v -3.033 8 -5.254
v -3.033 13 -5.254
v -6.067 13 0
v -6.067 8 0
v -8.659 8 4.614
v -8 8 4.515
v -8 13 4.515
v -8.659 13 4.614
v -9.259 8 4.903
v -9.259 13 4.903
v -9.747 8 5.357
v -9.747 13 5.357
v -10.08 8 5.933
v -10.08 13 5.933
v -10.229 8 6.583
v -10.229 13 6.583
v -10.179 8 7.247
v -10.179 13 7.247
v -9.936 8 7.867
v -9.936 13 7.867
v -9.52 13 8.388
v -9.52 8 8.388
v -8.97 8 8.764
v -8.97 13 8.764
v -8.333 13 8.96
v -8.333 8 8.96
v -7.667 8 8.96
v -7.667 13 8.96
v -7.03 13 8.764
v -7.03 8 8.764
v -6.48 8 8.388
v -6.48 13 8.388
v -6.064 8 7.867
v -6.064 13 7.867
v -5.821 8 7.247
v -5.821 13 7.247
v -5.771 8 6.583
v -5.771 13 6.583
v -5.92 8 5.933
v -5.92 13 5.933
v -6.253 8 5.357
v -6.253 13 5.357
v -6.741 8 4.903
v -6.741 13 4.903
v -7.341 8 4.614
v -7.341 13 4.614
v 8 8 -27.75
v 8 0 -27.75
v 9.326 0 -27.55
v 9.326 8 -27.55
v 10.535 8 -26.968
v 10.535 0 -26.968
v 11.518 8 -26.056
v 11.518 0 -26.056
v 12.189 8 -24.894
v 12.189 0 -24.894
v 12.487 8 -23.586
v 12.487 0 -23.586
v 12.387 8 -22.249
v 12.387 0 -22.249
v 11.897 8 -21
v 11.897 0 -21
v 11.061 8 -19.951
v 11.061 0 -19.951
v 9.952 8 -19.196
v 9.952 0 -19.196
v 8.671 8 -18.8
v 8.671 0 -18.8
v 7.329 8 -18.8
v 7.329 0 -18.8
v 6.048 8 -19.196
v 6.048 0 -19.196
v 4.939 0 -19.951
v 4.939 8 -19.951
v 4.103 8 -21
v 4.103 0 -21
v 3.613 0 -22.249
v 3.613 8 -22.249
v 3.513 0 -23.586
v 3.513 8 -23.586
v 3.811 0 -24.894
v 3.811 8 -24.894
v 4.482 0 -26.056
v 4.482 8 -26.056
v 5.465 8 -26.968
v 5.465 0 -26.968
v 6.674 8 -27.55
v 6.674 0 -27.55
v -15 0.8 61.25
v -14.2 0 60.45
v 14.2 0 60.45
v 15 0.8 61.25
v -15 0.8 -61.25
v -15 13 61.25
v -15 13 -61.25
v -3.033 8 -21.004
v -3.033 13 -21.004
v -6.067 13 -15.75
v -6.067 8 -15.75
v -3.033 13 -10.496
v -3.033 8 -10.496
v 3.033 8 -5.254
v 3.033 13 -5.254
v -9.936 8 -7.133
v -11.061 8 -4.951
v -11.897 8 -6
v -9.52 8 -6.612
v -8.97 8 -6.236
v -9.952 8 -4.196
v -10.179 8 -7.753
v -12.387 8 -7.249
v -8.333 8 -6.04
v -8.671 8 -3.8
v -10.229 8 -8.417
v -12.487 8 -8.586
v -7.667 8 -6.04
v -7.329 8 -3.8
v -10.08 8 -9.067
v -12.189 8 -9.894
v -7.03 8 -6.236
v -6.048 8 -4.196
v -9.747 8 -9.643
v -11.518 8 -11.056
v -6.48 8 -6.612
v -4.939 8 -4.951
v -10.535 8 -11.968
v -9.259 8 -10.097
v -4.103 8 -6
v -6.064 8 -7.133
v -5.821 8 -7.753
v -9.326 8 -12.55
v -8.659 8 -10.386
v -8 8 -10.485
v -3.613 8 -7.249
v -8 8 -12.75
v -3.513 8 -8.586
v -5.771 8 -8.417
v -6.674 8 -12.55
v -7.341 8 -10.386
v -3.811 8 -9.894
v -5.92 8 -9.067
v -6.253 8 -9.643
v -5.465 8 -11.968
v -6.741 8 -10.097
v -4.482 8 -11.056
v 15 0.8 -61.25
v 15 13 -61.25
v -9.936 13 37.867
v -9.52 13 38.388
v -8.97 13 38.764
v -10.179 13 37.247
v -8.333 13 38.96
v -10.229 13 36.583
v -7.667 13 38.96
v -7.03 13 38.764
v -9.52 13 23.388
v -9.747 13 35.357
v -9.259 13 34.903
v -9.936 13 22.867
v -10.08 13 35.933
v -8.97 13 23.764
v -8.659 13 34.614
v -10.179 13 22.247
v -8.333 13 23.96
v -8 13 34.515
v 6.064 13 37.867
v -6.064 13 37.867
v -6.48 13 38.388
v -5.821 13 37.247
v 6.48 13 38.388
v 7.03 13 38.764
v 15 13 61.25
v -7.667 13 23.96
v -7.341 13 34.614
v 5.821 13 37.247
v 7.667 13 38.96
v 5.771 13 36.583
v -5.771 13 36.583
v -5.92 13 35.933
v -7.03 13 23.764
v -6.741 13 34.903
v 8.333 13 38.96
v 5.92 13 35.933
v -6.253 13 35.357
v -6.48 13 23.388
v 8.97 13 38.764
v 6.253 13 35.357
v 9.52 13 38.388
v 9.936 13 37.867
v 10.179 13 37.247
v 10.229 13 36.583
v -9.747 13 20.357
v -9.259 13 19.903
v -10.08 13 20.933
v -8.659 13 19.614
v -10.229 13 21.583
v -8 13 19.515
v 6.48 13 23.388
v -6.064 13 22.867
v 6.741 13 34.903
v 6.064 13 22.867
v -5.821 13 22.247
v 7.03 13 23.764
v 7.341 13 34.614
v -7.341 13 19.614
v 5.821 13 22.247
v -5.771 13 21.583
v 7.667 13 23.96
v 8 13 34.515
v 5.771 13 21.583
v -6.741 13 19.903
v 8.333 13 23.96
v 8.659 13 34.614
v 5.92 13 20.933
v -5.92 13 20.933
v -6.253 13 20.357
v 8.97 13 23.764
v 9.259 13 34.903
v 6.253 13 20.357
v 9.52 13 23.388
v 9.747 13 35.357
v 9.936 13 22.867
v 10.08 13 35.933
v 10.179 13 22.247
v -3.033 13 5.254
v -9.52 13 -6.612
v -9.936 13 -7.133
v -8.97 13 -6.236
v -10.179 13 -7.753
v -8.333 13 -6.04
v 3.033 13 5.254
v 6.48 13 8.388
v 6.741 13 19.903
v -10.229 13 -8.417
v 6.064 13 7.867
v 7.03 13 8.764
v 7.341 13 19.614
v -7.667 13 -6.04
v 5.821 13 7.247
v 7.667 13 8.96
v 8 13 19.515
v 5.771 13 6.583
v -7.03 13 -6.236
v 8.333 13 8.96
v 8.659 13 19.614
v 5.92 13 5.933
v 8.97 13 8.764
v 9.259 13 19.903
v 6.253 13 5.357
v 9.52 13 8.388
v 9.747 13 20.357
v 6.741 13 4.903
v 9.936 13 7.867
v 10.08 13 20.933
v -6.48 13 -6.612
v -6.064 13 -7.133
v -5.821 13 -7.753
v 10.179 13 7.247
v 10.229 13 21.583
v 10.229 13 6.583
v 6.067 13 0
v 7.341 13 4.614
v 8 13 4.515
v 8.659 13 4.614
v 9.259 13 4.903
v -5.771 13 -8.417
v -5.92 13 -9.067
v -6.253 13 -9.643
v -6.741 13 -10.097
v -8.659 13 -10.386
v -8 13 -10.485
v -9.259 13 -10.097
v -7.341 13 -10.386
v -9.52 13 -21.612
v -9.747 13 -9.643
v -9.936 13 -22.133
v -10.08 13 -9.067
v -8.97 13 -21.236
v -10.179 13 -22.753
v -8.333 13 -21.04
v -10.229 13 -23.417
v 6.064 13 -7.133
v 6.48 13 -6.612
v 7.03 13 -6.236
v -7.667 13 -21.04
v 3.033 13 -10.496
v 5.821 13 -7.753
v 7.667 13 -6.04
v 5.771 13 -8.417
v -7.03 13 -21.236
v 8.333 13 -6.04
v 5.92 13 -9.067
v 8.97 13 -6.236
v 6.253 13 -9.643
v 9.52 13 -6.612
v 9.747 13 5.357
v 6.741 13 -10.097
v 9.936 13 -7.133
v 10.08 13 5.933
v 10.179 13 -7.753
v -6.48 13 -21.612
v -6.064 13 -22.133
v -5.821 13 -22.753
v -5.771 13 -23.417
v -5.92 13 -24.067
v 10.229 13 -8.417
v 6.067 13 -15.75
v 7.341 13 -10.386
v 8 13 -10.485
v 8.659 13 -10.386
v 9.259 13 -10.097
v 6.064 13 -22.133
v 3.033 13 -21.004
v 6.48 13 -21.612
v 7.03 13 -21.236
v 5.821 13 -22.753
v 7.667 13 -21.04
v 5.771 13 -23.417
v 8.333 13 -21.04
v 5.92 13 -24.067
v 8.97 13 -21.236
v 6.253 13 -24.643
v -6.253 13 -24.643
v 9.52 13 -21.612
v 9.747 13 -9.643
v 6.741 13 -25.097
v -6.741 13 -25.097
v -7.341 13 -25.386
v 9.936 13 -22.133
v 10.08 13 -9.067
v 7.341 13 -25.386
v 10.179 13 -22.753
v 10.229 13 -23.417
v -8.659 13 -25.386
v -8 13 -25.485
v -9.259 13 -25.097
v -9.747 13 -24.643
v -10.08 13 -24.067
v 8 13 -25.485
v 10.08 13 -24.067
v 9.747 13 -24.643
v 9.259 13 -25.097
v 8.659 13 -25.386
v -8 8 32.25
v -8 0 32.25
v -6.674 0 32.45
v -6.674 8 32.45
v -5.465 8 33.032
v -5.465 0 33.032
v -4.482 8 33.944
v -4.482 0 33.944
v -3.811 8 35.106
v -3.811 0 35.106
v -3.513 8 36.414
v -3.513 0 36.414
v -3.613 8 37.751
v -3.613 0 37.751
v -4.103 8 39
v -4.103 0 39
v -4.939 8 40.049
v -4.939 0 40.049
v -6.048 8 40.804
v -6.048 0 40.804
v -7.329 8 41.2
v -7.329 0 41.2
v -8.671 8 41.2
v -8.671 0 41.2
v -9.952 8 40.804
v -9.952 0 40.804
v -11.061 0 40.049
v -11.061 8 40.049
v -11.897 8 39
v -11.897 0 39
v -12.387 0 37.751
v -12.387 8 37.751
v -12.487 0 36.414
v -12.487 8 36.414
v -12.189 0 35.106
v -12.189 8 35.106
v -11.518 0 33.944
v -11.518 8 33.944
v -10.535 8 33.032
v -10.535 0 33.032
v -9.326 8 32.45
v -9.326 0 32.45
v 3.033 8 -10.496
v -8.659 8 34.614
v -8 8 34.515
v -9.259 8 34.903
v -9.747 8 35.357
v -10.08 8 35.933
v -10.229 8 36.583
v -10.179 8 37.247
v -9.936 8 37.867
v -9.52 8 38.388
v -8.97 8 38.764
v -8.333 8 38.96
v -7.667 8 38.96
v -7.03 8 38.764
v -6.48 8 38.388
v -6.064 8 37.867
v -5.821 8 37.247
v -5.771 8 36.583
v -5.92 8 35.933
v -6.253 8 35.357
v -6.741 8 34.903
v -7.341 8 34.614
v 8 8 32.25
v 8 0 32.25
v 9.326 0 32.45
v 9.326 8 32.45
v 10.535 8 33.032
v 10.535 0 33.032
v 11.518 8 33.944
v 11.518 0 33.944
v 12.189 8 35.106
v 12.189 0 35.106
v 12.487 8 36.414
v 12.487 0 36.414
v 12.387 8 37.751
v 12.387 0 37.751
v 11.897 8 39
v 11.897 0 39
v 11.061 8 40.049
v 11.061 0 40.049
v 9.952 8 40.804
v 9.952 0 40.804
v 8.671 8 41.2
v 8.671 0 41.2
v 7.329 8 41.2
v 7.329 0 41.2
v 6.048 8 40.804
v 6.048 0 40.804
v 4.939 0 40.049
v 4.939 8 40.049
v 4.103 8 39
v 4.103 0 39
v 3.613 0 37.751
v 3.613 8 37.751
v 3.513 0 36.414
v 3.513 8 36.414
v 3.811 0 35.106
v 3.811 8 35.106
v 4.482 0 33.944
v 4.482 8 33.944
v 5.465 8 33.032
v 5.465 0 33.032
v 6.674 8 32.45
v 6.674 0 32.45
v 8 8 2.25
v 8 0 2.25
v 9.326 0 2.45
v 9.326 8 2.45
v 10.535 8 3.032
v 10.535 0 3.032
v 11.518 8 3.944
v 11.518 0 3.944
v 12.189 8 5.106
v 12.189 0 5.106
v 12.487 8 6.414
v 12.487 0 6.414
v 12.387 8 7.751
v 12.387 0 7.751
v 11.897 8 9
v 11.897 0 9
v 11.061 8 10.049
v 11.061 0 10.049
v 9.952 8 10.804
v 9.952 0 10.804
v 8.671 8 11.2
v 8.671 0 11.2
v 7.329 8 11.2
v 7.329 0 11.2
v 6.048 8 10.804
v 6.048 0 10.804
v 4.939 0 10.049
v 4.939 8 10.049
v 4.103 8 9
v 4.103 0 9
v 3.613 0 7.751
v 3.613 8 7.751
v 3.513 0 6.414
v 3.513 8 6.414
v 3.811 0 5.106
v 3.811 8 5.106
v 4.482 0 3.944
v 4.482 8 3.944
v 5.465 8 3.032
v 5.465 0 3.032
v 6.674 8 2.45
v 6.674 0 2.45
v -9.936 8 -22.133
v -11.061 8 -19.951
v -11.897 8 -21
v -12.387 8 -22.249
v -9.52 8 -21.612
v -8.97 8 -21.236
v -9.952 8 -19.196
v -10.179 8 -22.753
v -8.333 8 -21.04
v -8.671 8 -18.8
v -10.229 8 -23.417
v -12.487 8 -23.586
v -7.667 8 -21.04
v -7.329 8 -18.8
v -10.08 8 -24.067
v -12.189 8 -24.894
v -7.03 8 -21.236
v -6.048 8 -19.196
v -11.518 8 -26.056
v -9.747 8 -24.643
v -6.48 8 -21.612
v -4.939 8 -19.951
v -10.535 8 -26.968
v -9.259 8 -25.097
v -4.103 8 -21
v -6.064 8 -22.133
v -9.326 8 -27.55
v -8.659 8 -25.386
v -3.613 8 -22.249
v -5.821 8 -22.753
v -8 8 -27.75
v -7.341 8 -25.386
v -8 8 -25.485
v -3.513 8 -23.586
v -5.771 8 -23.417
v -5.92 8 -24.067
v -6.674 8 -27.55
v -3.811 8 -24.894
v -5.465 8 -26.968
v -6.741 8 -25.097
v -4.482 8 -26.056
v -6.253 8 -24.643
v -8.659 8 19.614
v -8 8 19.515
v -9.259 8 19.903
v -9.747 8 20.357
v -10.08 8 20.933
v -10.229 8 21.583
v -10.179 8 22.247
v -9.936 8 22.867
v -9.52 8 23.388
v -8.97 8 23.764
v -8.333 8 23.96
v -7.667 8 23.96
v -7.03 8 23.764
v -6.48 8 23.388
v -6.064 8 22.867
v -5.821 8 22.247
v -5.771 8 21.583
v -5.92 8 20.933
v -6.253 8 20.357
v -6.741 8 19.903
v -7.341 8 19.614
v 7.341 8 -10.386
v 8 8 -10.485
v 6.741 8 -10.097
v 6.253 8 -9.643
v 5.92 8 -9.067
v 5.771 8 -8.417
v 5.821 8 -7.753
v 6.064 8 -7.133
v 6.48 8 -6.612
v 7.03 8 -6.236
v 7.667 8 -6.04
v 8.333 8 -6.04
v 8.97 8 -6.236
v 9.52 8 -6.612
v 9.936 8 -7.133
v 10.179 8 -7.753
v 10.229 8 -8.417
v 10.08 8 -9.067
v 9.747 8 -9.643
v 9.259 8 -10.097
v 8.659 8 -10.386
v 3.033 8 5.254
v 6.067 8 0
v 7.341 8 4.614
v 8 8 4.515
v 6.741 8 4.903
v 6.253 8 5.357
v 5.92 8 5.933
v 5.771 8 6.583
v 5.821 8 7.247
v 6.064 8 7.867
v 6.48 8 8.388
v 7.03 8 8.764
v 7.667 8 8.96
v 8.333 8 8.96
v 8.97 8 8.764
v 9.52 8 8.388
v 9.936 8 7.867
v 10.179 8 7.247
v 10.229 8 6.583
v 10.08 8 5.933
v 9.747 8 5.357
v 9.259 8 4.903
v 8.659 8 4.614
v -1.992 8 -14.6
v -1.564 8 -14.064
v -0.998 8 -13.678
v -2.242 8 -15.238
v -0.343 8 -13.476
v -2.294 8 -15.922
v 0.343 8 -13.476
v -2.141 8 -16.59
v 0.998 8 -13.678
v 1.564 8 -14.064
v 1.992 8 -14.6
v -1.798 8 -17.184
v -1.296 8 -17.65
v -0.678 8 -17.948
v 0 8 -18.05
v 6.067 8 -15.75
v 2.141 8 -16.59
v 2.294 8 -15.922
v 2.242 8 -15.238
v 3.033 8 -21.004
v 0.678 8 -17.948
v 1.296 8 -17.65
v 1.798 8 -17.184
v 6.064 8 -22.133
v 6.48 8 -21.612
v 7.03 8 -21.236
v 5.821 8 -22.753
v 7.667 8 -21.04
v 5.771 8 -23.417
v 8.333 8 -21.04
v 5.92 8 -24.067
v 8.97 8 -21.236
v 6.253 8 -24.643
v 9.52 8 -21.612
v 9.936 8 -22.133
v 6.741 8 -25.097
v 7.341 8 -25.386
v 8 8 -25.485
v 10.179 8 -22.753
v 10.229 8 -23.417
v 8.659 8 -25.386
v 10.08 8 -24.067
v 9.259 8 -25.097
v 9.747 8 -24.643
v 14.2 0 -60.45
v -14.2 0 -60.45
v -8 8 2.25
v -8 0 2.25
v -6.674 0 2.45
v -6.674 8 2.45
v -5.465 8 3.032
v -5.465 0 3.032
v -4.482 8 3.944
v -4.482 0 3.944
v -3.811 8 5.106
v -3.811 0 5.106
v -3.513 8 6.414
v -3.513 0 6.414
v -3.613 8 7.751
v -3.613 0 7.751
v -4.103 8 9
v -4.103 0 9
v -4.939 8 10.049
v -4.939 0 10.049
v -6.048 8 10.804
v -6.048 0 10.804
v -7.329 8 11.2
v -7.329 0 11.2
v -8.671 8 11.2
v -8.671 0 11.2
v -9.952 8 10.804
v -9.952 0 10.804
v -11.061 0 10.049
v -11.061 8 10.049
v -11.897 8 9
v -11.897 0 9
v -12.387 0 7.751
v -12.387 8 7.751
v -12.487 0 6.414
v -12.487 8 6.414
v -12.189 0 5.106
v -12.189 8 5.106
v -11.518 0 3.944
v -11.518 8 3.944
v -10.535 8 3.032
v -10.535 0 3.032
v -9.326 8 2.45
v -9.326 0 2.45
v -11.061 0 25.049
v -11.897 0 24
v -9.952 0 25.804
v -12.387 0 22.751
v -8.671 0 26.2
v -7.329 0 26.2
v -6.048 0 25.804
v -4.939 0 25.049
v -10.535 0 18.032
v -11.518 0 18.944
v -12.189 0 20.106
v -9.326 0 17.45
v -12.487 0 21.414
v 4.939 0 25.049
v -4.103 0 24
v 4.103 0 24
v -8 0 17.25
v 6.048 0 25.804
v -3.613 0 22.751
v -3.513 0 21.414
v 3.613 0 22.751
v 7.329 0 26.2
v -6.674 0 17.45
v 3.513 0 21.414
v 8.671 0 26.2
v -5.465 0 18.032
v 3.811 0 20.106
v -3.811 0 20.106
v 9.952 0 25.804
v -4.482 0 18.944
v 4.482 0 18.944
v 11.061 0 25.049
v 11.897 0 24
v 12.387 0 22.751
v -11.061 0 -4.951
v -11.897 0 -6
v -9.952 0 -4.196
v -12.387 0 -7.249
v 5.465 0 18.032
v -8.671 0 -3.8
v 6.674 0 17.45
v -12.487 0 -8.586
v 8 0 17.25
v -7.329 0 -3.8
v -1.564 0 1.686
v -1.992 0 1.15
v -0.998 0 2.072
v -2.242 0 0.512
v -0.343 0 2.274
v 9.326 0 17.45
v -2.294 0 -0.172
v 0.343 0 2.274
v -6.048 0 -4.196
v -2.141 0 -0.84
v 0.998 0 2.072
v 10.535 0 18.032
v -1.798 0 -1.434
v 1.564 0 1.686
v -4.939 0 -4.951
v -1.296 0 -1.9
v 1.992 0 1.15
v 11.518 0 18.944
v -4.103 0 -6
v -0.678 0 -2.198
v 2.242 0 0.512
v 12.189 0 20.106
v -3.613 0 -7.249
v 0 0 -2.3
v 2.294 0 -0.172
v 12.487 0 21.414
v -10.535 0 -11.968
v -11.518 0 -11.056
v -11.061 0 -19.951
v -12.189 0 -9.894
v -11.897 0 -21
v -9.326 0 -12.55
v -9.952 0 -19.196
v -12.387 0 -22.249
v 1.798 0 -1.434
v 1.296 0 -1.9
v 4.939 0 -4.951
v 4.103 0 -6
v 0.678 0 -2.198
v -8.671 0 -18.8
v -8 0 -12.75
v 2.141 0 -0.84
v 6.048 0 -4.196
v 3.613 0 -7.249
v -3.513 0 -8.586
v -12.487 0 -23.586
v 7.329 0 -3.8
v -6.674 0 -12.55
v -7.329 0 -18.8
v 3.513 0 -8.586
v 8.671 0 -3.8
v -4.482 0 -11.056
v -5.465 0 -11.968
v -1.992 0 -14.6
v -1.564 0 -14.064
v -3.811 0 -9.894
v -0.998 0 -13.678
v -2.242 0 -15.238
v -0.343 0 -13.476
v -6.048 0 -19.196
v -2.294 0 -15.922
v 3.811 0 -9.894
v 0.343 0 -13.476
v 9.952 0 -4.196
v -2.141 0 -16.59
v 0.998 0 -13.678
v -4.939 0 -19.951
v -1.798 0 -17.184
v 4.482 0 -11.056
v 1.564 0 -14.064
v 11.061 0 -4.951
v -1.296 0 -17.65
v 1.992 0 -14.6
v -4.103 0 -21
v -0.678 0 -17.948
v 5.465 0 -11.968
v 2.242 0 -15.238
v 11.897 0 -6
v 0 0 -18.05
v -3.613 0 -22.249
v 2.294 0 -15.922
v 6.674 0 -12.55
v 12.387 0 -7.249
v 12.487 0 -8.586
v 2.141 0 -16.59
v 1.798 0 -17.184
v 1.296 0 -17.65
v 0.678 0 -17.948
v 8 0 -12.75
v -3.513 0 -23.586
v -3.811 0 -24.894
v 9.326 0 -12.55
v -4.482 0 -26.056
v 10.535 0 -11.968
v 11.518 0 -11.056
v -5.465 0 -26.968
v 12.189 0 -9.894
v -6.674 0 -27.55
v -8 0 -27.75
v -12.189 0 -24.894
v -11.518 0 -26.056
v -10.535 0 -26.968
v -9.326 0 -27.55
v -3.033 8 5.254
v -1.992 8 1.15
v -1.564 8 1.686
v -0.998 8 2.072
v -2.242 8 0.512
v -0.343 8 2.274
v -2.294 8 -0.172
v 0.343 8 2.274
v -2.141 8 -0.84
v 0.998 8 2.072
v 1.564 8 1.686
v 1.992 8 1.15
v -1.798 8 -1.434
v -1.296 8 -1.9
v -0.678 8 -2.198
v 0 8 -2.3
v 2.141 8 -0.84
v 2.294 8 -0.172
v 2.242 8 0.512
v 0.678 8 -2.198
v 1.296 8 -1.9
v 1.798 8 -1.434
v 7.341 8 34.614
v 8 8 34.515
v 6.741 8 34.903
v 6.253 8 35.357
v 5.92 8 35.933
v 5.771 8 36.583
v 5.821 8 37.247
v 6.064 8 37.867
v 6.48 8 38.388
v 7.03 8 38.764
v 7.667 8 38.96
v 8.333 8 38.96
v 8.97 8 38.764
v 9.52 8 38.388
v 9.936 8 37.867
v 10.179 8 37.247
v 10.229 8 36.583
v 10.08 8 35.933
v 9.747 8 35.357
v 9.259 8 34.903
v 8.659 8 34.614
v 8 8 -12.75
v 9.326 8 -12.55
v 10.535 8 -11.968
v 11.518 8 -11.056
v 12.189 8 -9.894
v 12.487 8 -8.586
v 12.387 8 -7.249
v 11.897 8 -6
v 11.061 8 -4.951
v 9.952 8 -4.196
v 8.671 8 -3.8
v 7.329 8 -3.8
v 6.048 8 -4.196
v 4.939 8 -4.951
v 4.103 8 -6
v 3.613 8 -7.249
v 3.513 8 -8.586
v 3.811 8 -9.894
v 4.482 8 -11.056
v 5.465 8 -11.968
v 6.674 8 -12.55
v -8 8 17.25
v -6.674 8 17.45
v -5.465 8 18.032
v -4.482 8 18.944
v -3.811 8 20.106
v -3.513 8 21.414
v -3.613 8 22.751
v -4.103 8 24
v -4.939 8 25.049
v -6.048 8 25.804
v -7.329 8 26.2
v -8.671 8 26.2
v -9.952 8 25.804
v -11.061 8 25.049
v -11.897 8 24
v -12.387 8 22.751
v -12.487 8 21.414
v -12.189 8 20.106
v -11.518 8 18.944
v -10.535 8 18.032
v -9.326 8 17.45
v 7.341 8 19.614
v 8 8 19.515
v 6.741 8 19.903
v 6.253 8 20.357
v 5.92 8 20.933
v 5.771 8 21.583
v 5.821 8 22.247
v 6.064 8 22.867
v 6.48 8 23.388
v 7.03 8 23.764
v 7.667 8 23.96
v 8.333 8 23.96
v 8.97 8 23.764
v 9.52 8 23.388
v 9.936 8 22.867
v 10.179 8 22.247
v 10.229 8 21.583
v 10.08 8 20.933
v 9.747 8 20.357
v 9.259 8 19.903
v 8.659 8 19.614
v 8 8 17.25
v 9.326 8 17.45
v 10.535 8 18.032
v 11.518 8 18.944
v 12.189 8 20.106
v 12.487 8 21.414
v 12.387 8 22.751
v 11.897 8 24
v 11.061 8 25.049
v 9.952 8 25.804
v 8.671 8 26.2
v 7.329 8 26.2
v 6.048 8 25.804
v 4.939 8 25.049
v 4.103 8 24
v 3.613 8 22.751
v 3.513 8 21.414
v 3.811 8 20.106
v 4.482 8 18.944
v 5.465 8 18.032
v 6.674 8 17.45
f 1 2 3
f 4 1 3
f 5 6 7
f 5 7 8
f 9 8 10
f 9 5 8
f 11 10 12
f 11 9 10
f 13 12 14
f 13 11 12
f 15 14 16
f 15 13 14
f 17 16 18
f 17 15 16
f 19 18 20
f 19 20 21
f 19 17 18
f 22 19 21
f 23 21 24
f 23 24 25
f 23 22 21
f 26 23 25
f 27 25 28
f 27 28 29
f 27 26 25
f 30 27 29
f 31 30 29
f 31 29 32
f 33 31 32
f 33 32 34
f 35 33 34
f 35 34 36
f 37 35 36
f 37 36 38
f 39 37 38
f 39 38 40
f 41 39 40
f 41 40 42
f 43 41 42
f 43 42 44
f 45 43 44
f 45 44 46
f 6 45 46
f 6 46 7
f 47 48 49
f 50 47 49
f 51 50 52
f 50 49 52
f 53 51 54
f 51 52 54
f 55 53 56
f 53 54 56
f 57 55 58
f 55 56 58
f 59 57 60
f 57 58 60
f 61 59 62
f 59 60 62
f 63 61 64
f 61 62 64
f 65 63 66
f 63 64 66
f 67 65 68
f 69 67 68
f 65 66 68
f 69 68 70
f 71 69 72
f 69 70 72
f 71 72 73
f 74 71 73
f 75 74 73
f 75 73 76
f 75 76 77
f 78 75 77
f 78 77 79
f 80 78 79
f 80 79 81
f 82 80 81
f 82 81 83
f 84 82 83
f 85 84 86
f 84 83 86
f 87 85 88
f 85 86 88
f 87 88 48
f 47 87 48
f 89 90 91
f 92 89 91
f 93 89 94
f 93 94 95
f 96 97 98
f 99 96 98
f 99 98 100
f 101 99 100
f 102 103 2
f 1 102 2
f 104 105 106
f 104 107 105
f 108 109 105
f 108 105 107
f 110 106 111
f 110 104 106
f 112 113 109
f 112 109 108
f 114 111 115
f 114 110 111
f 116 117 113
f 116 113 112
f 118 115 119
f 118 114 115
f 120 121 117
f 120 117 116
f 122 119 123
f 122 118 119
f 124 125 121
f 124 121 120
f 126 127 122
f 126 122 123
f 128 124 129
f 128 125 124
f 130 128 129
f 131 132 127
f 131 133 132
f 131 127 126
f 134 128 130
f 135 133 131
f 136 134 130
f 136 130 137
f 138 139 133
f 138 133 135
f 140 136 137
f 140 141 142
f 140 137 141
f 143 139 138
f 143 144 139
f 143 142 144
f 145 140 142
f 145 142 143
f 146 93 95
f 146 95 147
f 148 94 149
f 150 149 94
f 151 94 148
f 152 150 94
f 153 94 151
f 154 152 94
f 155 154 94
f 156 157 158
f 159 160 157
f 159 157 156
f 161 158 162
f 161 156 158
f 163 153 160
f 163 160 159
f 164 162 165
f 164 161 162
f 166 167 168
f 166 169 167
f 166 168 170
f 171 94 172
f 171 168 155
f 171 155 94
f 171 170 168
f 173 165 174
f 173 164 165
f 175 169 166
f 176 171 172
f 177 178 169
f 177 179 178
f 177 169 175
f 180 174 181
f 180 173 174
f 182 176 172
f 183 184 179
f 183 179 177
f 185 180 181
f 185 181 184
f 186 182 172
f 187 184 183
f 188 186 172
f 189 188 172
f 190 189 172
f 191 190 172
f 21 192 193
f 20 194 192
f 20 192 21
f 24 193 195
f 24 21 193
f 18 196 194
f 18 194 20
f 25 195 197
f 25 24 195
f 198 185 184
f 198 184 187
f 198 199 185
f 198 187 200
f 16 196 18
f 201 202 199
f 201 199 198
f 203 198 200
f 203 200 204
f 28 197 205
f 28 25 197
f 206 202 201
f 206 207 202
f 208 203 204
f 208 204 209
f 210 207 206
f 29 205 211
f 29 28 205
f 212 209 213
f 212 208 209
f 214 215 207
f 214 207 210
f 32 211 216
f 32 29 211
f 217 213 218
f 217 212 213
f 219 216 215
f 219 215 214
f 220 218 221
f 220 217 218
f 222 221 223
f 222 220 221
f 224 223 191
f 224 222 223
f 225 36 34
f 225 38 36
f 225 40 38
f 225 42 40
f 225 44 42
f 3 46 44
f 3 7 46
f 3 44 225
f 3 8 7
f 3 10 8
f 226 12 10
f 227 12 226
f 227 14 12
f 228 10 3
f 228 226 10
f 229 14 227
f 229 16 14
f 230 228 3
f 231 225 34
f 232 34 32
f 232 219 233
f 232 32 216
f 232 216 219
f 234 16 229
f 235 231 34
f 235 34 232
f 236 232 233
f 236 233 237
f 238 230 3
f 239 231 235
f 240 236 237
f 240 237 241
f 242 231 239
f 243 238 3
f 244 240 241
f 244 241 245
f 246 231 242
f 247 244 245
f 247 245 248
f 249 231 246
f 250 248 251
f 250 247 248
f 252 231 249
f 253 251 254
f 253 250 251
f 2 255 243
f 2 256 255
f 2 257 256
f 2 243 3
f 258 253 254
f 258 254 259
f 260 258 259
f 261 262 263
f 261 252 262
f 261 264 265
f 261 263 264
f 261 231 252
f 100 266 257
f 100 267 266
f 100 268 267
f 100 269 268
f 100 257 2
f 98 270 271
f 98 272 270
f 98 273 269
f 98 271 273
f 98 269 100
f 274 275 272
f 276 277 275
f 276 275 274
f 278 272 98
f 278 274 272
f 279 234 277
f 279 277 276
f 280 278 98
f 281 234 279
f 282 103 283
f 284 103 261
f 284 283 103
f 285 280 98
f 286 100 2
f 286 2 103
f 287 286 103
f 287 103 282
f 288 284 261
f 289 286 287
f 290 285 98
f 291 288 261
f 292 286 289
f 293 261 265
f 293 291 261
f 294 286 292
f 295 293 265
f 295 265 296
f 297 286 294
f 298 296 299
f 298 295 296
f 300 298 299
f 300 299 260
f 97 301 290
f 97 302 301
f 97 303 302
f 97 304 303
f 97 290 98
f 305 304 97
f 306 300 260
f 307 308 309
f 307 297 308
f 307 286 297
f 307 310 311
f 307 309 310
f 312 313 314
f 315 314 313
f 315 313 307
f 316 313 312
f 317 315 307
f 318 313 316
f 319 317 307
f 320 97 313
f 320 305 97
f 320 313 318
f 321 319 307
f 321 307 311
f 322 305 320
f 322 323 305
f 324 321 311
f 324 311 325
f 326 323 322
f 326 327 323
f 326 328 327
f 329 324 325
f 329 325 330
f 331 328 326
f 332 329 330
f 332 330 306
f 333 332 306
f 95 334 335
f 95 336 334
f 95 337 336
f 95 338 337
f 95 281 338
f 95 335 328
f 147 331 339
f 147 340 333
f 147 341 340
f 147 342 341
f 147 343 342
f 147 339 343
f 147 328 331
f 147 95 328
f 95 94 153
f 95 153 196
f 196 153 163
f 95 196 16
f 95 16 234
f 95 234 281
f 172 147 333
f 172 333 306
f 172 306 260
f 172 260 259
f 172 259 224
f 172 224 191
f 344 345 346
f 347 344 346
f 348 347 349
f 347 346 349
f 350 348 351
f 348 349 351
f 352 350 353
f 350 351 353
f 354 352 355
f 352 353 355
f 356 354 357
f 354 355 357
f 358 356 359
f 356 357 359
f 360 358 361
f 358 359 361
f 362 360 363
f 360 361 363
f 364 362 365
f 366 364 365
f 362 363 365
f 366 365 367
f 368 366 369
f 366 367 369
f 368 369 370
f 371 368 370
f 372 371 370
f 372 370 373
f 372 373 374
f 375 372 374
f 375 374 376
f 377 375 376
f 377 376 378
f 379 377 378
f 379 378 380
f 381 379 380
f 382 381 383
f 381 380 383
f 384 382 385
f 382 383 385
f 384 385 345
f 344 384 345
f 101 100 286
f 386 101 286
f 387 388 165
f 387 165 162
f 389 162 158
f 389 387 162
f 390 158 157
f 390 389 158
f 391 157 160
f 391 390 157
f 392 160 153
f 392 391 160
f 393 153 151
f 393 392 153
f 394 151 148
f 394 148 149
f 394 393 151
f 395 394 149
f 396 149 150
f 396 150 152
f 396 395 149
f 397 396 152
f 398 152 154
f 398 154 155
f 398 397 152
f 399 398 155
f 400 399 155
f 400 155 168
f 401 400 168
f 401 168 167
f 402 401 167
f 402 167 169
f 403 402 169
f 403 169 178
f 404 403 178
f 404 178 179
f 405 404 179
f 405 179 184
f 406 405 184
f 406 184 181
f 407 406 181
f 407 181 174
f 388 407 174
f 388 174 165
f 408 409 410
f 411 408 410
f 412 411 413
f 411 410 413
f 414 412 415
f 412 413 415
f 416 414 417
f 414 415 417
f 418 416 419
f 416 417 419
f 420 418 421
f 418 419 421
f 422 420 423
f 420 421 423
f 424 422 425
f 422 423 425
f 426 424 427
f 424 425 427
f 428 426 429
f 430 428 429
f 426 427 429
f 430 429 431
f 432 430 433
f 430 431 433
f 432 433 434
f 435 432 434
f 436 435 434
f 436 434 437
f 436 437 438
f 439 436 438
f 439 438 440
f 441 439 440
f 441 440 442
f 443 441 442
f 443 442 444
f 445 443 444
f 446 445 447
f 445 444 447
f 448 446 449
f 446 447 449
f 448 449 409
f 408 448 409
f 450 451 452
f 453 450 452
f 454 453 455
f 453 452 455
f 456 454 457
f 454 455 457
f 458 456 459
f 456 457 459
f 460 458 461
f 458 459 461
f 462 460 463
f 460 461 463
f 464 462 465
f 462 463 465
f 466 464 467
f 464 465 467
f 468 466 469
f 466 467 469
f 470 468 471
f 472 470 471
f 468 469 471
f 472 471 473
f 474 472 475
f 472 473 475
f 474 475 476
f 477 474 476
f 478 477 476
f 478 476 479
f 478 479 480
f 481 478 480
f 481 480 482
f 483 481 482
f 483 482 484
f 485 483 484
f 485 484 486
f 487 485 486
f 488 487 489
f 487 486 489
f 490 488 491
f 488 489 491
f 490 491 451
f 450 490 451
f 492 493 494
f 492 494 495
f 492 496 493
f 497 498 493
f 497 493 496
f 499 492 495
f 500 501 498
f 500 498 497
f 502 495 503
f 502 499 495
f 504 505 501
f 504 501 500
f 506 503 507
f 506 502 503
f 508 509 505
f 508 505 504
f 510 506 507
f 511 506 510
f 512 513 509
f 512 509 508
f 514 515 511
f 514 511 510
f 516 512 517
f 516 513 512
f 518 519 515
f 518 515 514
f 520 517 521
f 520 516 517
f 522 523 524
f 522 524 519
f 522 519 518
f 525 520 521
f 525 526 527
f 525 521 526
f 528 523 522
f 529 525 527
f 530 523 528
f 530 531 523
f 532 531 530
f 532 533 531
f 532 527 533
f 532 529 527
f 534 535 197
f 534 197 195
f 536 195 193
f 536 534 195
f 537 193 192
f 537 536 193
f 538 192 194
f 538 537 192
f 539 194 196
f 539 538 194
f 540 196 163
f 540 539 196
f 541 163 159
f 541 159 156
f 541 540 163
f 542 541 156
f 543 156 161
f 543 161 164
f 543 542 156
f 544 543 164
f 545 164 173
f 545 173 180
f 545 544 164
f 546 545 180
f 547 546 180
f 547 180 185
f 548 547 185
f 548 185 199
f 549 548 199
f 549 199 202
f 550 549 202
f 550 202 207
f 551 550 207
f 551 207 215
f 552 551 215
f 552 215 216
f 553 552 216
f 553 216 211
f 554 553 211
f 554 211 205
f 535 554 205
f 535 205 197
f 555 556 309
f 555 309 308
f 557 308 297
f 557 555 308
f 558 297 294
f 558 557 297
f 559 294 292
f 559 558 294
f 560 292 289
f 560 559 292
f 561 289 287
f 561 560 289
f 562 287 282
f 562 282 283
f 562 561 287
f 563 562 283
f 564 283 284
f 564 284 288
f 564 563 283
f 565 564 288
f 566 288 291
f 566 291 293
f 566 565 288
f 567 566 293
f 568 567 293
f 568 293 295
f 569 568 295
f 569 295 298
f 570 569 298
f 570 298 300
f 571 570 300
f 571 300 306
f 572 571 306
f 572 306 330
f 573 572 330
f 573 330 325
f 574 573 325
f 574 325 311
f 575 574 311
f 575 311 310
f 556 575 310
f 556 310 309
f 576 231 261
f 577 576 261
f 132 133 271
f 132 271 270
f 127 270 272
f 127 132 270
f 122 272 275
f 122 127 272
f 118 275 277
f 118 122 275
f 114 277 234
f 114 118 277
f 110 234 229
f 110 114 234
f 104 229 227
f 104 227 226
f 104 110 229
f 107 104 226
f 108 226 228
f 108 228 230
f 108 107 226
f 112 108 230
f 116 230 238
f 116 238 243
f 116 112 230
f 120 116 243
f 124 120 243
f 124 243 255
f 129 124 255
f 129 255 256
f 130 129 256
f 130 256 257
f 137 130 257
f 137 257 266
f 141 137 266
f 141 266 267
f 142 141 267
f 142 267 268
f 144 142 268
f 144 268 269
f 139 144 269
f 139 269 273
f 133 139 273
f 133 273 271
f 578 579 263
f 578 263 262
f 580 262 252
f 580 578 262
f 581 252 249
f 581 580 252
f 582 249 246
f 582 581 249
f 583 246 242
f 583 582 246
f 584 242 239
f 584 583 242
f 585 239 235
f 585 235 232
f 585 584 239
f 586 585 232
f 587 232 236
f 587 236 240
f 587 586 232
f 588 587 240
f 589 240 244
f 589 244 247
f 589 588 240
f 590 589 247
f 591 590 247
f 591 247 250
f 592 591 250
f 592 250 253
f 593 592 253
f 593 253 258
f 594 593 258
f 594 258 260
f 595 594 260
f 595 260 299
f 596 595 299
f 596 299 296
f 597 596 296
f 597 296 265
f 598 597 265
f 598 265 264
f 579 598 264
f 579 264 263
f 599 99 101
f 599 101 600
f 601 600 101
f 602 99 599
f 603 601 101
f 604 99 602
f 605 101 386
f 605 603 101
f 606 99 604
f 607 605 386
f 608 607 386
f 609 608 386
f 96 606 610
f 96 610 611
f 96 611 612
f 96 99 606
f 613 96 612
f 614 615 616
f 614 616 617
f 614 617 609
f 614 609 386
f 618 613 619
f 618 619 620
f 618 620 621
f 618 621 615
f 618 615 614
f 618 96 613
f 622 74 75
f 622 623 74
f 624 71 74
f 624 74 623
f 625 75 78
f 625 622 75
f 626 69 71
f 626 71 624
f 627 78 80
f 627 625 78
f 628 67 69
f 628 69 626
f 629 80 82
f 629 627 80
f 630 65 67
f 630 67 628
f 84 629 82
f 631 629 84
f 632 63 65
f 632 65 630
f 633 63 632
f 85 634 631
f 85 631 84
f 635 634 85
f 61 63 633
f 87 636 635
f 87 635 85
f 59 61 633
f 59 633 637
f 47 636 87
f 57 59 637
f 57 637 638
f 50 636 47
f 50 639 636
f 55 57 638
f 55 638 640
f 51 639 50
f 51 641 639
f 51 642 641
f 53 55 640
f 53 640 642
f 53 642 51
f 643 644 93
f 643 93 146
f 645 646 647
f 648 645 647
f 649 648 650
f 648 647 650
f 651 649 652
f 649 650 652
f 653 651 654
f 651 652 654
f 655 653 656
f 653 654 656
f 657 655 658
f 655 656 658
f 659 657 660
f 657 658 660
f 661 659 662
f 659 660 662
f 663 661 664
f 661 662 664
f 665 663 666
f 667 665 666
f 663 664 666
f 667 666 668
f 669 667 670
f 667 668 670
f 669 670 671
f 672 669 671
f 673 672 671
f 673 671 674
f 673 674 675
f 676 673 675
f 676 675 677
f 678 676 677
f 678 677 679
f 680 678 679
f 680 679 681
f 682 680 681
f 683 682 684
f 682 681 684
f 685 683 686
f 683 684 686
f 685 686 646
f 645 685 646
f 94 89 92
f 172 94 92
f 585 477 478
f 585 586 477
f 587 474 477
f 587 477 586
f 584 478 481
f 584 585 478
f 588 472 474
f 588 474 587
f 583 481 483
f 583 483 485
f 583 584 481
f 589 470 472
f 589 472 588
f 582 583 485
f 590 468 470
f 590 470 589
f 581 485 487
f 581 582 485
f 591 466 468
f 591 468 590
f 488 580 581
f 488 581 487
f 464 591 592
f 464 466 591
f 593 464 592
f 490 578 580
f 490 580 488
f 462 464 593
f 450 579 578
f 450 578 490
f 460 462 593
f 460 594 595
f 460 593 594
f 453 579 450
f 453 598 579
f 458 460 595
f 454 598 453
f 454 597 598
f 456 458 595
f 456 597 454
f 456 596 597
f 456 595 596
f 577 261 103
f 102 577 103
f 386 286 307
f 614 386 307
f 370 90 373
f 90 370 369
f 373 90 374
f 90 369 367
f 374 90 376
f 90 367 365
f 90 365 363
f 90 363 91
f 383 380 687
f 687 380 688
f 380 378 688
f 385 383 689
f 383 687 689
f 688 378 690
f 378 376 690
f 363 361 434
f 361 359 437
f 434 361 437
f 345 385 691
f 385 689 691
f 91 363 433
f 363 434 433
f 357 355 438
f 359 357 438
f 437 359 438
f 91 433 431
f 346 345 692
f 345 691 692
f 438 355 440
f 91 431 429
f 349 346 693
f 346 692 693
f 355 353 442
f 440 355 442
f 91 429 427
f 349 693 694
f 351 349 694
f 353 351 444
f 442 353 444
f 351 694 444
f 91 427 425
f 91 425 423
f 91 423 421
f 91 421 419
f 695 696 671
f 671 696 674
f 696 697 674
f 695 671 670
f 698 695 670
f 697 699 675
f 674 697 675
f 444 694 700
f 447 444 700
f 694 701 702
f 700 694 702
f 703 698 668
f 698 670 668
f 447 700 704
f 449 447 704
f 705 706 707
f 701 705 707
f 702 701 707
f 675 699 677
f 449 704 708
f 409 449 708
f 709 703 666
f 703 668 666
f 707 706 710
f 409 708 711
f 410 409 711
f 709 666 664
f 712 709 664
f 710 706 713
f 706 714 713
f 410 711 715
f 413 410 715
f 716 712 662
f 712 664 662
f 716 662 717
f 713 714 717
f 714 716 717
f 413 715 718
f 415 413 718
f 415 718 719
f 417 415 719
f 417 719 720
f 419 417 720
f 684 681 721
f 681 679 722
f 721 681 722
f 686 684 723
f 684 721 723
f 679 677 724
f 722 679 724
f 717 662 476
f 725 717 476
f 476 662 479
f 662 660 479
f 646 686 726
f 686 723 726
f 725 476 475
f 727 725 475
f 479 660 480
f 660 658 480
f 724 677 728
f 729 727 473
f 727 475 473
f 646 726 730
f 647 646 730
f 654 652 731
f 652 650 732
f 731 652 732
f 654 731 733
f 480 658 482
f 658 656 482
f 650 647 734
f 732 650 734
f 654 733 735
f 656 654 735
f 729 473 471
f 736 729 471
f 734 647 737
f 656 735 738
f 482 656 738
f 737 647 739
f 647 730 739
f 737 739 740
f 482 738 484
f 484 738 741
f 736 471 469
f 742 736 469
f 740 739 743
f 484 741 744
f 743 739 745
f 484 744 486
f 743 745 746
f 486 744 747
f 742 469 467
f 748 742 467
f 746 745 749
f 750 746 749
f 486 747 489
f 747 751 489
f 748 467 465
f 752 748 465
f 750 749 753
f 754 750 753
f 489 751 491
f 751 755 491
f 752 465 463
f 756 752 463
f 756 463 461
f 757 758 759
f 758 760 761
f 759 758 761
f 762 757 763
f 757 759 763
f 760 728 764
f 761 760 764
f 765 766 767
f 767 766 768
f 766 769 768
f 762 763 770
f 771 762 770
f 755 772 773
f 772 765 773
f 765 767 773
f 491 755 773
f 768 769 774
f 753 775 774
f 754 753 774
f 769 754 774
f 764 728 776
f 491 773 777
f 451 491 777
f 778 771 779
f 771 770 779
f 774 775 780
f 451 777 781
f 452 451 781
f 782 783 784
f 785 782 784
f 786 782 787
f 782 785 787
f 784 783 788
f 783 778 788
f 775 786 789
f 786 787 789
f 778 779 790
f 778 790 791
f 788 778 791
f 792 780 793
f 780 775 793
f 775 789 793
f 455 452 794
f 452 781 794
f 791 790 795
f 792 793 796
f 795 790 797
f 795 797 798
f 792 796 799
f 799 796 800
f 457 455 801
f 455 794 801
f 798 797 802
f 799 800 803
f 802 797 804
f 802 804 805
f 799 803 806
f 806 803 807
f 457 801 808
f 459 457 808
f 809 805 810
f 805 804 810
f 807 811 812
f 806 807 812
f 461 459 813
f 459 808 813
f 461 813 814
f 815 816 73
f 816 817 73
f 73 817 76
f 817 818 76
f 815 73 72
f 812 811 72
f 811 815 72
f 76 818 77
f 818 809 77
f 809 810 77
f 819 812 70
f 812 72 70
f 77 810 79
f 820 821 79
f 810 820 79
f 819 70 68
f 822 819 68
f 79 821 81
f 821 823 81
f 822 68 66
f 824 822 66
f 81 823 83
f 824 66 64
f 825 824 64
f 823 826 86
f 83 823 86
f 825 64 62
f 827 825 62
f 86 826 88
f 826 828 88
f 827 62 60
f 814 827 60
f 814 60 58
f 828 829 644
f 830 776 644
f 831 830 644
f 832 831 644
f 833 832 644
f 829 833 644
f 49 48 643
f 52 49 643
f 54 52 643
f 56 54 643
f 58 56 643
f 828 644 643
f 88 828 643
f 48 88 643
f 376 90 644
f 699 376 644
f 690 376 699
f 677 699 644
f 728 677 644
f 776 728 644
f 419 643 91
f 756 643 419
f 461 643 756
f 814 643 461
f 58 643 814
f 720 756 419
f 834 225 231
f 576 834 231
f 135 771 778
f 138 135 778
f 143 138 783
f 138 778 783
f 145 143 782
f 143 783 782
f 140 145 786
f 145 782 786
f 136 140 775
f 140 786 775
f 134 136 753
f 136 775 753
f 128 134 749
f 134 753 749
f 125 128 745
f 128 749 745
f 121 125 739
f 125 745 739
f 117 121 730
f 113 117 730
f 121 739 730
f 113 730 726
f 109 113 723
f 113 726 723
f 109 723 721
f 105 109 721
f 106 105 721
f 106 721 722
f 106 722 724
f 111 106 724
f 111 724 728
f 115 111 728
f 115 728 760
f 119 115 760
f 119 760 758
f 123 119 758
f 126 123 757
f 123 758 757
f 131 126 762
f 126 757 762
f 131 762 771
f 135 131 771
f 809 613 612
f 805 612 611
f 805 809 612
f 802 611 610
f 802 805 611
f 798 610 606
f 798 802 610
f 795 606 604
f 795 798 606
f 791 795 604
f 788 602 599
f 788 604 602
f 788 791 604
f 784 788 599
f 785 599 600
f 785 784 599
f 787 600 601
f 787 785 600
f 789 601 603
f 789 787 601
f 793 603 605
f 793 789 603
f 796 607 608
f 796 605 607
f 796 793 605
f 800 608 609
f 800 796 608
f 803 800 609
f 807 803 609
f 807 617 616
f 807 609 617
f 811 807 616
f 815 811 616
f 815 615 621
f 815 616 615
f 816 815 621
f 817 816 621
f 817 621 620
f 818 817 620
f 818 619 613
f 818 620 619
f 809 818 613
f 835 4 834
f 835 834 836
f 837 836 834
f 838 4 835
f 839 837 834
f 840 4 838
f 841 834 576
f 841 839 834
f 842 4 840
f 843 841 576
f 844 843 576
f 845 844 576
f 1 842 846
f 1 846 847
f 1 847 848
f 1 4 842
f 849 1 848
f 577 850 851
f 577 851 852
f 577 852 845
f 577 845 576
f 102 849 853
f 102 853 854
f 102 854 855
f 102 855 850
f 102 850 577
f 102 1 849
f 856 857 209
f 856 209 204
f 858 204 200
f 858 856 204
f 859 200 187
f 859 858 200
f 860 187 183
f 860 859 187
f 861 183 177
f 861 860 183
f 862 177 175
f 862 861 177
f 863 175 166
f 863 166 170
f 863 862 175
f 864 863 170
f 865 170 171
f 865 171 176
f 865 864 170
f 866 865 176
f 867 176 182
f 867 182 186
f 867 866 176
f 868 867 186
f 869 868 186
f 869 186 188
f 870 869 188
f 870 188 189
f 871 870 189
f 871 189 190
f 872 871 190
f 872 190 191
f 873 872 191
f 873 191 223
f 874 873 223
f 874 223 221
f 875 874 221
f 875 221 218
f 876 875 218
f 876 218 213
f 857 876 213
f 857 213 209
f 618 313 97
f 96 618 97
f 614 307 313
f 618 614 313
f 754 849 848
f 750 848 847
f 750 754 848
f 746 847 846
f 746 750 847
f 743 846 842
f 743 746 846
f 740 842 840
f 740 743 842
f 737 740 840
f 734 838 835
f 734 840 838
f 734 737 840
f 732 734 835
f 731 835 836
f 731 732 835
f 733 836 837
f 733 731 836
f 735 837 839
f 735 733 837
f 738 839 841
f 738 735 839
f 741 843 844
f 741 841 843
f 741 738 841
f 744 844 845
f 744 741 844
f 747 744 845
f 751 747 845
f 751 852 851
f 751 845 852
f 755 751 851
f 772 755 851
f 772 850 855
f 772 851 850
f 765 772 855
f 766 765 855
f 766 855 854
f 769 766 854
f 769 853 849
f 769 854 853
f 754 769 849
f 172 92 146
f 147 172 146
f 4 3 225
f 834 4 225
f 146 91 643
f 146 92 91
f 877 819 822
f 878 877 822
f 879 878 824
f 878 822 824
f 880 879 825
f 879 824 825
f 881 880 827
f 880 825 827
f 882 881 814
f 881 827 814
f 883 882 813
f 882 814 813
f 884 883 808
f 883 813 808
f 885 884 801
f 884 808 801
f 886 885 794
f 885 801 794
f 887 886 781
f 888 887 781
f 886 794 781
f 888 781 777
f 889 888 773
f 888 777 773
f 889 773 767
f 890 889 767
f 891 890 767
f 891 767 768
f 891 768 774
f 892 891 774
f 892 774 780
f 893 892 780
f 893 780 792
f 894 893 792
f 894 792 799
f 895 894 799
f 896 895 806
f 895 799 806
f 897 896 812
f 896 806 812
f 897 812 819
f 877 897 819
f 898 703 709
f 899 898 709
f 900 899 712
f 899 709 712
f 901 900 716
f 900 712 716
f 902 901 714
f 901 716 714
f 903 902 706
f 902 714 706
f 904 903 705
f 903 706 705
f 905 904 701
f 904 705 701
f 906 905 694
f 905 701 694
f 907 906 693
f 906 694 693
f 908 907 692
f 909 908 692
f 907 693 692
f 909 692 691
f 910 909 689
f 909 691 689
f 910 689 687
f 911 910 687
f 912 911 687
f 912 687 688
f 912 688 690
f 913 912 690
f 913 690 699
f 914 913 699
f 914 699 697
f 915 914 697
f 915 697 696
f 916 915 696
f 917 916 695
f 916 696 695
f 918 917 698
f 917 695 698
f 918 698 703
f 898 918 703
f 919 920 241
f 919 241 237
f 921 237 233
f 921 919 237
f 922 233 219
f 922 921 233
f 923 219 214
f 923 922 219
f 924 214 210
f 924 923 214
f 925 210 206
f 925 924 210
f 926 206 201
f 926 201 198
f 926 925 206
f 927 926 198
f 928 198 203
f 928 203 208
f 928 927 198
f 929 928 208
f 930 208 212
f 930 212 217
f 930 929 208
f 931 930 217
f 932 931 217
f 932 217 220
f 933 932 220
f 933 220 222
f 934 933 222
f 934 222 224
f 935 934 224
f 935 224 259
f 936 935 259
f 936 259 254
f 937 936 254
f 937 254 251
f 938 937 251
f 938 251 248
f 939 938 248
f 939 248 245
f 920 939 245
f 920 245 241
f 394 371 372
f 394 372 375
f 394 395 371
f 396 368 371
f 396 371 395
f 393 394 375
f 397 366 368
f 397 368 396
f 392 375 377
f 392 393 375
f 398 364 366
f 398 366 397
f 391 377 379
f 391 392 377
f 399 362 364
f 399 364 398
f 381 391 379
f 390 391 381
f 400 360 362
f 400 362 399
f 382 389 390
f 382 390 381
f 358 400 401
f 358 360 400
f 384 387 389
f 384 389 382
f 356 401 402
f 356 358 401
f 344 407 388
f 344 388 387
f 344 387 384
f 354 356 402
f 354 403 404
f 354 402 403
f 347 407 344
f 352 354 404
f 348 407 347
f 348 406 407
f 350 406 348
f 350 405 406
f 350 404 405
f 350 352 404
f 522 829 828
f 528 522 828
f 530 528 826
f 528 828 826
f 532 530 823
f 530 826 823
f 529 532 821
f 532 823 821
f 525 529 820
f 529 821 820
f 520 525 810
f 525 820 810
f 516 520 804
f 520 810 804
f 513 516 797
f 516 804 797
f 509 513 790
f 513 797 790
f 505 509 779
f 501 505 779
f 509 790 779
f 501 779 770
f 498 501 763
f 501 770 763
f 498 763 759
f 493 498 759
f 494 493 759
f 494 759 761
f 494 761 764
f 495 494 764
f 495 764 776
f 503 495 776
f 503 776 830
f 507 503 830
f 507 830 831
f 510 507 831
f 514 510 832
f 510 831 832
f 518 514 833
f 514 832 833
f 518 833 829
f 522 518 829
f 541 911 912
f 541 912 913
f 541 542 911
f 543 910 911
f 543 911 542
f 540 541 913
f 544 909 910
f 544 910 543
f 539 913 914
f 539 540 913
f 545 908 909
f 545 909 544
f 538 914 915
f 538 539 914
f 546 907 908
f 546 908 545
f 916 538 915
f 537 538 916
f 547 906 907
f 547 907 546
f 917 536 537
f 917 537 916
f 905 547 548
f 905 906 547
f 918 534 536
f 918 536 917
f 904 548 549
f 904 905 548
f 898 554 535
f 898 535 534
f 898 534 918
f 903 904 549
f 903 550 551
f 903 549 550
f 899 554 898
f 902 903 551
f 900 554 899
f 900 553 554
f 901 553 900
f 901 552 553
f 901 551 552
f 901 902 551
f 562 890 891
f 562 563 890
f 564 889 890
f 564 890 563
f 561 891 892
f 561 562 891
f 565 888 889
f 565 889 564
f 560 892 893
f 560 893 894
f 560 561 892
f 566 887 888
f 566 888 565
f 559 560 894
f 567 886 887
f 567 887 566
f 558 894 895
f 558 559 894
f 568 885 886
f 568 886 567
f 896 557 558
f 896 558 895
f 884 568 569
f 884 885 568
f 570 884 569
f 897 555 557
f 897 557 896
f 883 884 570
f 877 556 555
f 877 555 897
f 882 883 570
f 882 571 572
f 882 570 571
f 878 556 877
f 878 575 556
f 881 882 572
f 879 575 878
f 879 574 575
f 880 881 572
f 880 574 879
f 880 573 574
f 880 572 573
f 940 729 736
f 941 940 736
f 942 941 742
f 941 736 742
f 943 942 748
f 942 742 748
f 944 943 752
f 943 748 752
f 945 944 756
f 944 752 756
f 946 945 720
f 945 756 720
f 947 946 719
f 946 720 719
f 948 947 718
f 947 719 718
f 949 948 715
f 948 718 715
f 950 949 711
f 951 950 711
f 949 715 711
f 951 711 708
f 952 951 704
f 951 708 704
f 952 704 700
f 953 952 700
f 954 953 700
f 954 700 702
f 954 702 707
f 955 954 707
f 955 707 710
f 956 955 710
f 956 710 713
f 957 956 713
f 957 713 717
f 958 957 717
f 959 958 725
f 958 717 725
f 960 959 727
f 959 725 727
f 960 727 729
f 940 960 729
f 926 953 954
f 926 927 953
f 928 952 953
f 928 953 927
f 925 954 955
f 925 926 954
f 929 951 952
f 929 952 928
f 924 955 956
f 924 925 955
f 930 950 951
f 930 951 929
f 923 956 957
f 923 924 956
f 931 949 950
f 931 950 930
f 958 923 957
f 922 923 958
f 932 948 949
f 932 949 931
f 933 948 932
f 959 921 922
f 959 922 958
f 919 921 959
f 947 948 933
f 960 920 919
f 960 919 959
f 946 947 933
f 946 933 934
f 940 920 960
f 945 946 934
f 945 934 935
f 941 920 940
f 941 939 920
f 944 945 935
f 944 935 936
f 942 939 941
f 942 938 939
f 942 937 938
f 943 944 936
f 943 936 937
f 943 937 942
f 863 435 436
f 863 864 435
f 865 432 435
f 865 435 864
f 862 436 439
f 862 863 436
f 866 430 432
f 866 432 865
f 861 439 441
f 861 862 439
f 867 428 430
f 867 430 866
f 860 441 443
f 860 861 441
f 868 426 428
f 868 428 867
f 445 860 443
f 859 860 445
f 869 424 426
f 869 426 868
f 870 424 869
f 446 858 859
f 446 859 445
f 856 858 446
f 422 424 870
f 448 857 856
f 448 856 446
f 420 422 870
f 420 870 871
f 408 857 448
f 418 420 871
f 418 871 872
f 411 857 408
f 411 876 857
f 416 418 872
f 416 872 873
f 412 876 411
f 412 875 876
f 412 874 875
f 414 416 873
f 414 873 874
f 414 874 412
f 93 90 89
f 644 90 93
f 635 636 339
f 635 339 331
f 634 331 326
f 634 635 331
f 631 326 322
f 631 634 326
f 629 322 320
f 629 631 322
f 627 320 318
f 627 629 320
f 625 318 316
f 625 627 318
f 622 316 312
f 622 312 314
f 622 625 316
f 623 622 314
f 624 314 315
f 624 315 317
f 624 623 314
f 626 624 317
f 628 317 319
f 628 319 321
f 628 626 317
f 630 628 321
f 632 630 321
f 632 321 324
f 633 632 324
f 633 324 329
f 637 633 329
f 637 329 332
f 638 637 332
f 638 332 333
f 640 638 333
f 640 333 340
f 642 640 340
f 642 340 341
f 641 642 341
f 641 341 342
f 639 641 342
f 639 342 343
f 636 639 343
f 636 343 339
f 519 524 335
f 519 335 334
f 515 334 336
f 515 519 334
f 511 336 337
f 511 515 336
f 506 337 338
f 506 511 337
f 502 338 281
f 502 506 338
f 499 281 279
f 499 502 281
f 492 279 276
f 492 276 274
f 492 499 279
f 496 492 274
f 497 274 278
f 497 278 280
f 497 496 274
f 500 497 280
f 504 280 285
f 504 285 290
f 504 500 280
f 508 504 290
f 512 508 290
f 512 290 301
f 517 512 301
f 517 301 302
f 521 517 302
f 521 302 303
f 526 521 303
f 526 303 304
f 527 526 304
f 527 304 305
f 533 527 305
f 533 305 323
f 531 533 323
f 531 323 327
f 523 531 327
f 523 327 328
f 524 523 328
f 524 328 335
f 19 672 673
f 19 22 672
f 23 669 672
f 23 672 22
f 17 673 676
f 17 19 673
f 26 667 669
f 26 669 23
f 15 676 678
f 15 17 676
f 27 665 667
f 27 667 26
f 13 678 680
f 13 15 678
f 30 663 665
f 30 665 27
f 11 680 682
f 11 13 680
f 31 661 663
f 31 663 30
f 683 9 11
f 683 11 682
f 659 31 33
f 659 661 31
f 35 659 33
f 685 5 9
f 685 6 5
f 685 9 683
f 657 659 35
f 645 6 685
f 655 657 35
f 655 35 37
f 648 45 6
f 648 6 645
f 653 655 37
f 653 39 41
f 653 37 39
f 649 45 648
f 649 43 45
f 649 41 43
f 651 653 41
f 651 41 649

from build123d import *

# Parameters (mm, degrees)
SKETCH1_W           = 30
SKETCH1_H           = 122.5
SKETCH1_R           = 2.234949948
SKETCH1_R_2         = 2.3
BOSS_EXTRUDE1_DEPTH = 13
CUT_EXTRUDE1_DEPTH  = 5
CHAMFER1_SIZE       = 0.8
SKETCH3_R           = 4.5
CUT_EXTRUDE2_DEPTH  = 8
CHAMFER2_SIZE       = 0.8


with BuildPart() as part:
    # Sketch1 → Boss-Extrude1 (new body)
    with BuildSketch(Plane(origin=(0, 0, 0), x_dir=(1, 0, 0), z_dir=(0, 1, 0))):
        Rectangle(SKETCH1_W, SKETCH1_H)
        with Locations(Location((-8, 23.25, 0), (0, 0, 90))):
            Circle(SKETCH1_R, mode=Mode.SUBTRACT)
        with Locations(Location((8, 23.25, 0), (0, 0, 90))):
            Circle(SKETCH1_R, mode=Mode.SUBTRACT)
        with Locations(Location((8, 8.25, 0), (0, 0, 90))):
            Circle(SKETCH1_R, mode=Mode.SUBTRACT)
        with Locations(Location((8, -6.75, 0), (0, 0, 90))):
            Circle(SKETCH1_R, mode=Mode.SUBTRACT)
        with Locations(Location((8, -21.75, 0), (0, 0, 90))):
            Circle(SKETCH1_R, mode=Mode.SUBTRACT)
        with Locations(Location((8, -36.75, 0), (0, 0, 90))):
            Circle(SKETCH1_R, mode=Mode.SUBTRACT)
        with Locations(Location((-8, 8.25, 0), (0, 0, 90))):
            Circle(SKETCH1_R, mode=Mode.SUBTRACT)
        with Locations(Location((-8, -6.75, 0), (0, 0, 90))):
            Circle(SKETCH1_R, mode=Mode.SUBTRACT)
        with Locations(Location((-8, -21.75, 0), (0, 0, 90))):
            Circle(SKETCH1_R, mode=Mode.SUBTRACT)
        with Locations(Location((-8, -36.75, 0), (0, 0, 90))):
            Circle(SKETCH1_R, mode=Mode.SUBTRACT)
        with Locations(Location((0, 15.75, 0), (0, 0, 90))):
            Circle(SKETCH1_R_2, mode=Mode.SUBTRACT)
        with Locations(Location((0, 0, 0), (0, 0, 90))):
            Circle(SKETCH1_R_2, mode=Mode.SUBTRACT)
    extrude(amount=BOSS_EXTRUDE1_DEPTH)

    # Sketch2 → Cut-Extrude1 (cut)
    with BuildSketch(Plane(origin=(0, 13, 0), x_dir=(1, 0, 0), z_dir=(0, 1, 0))):
        Polygon((6.066941319, 0), (3.033470659, 5.254125305), (-3.033470659, 5.254125305), (-6.066941319, 0), (-3.033470659, -5.254125305), (3.033470659, -5.254125305), align=None)
        Polygon((6.066941319, 15.75), (3.033470659, 21.004125305), (-3.033470659, 21.004125305), (-6.066941319, 15.75), (-3.033470659, 10.495874695), (3.033470659, 10.495874695), align=None)
    extrude(amount=-CUT_EXTRUDE1_DEPTH, mode=Mode.SUBTRACT)

    # Chamfer1
    chamfer1_edges = [part.edges().sort_by_distance(p)[0] for p in [
        (-15, 0, 0),
        (15, 0, 0),
    ]]
    chamfer(chamfer1_edges, length=CHAMFER1_SIZE)

    # Sketch3 → Cut-Extrude2 (cut)
    with BuildSketch(Plane.XZ):
        with Locations(Location((8, 36.75, 0), (0, 0, 270))):
            Circle(SKETCH3_R)
        with Locations(Location((-8, 36.75, 0), (0, 0, 270))):
            Circle(SKETCH3_R)
        with Locations(Location((-8, 21.75, 0), (0, 0, 270))):
            Circle(SKETCH3_R)
        with Locations(Location((-8, 6.75, 0), (0, 0, 270))):
            Circle(SKETCH3_R)
        with Locations(Location((-8, -8.25, 0), (0, 0, 270))):
            Circle(SKETCH3_R)
        with Locations(Location((-8, -23.25, 0), (0, 0, 270))):
            Circle(SKETCH3_R)
        with Locations(Location((8, 21.75, 0), (0, 0, 270))):
            Circle(SKETCH3_R)
        with Locations(Location((8, 6.75, 0), (0, 0, 270))):
            Circle(SKETCH3_R)
        with Locations(Location((8, -8.25, 0), (0, 0, 270))):
            Circle(SKETCH3_R)
        with Locations(Location((8, -23.25, 0), (0, 0, 270))):
            Circle(SKETCH3_R)
    extrude(amount=-CUT_EXTRUDE2_DEPTH, mode=Mode.SUBTRACT)

    # Chamfer2
    chamfer2_edges = [part.edges().sort_by_distance(p)[0] for p in [
        (0, 0, -61.25),
        (0, 0, 61.25),
    ]]
    chamfer(chamfer2_edges, length=CHAMFER2_SIZE)


solid = part.part
